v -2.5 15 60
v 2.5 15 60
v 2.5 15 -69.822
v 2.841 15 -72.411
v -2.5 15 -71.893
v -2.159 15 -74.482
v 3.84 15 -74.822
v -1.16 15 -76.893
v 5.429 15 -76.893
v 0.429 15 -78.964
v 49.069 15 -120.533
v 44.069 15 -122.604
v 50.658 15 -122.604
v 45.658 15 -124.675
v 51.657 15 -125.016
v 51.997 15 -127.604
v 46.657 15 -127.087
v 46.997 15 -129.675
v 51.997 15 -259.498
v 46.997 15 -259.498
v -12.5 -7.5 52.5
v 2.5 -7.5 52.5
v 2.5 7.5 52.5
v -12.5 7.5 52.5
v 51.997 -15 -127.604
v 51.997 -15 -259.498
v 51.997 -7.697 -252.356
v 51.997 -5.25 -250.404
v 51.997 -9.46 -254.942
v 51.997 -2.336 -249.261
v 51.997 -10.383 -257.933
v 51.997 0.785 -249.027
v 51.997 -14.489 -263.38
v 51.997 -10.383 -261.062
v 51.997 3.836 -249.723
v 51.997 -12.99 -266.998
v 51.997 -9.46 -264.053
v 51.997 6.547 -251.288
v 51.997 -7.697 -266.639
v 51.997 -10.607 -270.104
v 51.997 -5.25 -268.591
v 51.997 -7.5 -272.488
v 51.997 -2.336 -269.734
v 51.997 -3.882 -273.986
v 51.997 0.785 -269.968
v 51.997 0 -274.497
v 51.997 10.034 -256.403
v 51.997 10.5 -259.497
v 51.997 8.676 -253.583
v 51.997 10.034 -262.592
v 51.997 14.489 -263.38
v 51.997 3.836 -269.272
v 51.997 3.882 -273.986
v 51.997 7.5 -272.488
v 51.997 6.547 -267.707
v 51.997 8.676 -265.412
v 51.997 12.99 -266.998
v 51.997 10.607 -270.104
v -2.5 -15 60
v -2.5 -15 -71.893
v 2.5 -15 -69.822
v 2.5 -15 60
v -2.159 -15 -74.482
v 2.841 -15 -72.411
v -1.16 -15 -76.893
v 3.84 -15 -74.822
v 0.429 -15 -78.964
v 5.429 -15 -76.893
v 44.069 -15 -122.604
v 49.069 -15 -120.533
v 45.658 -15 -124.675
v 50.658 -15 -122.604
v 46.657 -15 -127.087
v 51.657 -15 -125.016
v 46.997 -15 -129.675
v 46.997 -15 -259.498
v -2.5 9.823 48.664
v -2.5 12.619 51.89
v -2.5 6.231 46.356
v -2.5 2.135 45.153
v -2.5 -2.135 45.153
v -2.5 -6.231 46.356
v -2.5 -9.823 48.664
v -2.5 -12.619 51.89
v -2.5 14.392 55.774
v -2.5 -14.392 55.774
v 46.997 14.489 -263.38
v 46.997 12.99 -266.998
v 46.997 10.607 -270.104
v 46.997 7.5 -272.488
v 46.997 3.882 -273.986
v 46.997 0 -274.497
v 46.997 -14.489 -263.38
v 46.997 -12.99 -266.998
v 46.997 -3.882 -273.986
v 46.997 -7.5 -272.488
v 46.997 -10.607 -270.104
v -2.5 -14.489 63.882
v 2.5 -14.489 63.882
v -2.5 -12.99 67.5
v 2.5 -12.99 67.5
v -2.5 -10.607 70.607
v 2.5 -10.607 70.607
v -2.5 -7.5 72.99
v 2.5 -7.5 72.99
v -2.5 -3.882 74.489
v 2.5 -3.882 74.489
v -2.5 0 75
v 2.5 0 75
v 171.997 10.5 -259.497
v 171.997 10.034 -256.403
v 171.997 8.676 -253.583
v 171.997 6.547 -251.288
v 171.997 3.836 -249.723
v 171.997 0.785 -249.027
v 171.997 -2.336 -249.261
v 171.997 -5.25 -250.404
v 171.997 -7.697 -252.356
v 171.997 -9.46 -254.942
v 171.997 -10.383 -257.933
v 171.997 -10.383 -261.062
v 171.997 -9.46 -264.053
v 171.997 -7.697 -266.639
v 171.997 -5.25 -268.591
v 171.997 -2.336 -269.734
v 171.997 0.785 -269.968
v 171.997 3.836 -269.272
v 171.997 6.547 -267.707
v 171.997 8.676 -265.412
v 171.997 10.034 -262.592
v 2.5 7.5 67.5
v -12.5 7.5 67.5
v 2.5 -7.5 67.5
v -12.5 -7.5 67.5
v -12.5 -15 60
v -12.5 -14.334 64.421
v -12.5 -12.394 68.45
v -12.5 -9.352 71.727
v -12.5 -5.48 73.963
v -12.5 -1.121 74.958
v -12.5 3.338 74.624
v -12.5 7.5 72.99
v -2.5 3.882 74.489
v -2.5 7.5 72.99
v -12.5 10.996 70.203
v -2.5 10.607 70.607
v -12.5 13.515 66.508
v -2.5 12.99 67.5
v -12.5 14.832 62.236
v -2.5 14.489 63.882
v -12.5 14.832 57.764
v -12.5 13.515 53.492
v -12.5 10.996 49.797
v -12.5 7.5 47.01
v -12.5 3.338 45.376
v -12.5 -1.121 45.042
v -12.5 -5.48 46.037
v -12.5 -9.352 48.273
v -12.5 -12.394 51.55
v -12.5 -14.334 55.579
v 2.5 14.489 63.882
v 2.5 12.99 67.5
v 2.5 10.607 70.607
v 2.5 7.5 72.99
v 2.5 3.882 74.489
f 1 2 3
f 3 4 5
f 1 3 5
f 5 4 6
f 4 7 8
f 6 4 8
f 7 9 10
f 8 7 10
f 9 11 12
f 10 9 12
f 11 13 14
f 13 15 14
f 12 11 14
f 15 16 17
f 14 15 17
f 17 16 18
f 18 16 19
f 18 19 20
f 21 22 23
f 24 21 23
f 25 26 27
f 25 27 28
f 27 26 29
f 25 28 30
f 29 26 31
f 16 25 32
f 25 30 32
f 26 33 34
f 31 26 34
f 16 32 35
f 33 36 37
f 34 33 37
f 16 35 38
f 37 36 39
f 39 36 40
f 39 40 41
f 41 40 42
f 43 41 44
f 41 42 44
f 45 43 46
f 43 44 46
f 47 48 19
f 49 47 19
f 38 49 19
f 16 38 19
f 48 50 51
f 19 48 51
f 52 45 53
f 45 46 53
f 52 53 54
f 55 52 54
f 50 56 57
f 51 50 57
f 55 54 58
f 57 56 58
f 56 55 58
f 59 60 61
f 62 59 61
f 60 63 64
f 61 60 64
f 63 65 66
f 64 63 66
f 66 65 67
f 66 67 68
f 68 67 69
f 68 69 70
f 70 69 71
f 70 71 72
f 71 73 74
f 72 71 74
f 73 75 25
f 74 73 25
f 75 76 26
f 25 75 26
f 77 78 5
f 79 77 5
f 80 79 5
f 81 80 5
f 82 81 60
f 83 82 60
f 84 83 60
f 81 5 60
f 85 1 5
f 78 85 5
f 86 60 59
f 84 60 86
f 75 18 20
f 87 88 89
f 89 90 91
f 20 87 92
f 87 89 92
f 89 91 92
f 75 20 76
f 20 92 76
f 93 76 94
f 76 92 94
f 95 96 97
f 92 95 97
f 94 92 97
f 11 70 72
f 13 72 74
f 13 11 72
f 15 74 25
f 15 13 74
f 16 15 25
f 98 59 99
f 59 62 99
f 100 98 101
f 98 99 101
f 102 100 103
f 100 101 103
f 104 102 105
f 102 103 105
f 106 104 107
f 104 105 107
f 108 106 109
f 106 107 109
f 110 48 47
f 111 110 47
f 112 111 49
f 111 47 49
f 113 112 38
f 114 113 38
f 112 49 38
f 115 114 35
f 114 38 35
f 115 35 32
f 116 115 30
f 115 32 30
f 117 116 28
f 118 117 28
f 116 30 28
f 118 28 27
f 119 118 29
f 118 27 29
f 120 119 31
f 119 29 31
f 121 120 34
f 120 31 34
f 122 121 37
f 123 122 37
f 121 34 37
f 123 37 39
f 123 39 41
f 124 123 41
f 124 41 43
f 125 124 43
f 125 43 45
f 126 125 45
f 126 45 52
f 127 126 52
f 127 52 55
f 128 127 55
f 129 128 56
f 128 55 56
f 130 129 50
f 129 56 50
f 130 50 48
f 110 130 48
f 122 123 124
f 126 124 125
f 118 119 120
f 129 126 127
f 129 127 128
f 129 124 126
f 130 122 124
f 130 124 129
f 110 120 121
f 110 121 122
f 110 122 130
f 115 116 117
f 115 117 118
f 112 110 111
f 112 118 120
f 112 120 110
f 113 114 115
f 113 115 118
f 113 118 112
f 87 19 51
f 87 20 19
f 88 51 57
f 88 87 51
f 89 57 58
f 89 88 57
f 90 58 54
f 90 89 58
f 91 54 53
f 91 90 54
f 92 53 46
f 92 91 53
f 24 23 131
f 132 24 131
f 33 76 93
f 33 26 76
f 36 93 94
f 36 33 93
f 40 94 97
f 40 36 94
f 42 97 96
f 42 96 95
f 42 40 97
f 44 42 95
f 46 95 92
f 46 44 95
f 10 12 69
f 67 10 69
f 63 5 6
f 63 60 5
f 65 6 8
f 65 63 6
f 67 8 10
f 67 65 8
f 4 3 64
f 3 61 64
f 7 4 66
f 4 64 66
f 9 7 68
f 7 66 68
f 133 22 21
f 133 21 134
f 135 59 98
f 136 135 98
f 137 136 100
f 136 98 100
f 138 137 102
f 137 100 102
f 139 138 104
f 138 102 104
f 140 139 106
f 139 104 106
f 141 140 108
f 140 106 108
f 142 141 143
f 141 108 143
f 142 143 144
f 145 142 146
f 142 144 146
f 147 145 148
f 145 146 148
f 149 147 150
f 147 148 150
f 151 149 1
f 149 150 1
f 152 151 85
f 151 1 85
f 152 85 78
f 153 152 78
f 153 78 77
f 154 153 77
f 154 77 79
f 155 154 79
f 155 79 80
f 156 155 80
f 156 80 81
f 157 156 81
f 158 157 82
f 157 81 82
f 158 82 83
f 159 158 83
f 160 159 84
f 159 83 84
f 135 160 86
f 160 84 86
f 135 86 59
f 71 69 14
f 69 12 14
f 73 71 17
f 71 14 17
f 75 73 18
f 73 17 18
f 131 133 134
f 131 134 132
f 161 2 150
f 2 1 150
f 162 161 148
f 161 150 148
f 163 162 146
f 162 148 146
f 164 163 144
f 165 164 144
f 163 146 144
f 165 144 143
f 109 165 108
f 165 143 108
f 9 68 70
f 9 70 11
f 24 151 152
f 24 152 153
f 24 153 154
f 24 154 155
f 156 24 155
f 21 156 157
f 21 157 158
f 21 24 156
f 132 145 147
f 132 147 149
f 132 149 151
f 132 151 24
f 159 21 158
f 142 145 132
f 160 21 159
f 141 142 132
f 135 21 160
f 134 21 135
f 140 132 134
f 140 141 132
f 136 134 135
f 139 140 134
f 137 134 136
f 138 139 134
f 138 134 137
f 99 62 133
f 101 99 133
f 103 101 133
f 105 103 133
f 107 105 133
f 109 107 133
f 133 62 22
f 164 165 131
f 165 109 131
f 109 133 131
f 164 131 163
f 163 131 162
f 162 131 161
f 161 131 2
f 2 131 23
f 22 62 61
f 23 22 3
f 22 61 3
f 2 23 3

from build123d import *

# Parameters (mm, degrees)
SKETCH6_W               = 5
SKETCH6_H               = 30
SKETCH7_R               = 15
BOSS_EXTRUDE1_DEPTH     = 10
CUT_EXTRUDE1_DEPTH      = 281.256736501
CUT_EXTRUDE1_DEPTH_BACK = 281.256736501
SKETCH7_3_W             = 15
SKETCH7_3_H             = 15
FILLET1_R               = 10
FILLET2_R               = 15
SKETCH9_R               = 10.5
BOSS_EXTRUDE2_DEPTH     = 120


with BuildPart() as part:
    # Sweep1: sweep along a path in Sketch2
    with BuildLine(Plane(origin=(0, 0, 0), x_dir=(1, 0, 0), z_dir=(0, 1, 0))) as sweep1_path:
        Line((0, -75), (0, 75))
        Line((0, 75), (49.497474683, 124.497474683))
        Line((49.497474683, 124.497474683), (49.497474683, 274.497474683))
    # Sketch6 → Sweep1 (sweep)
    with BuildSketch(Plane.XY.offset(75)):
        Rectangle(SKETCH6_W, SKETCH6_H)
    sweep(path=sweep1_path.line, transition=Transition.RIGHT)

    # Sketch7 → Boss-Extrude1 (add)
    with BuildSketch(Plane.ZY.offset(2.5)):
        with Locations(Location((60, 0, 0), (0, 0, 270))):
            Circle(SKETCH7_R)
    extrude(amount=BOSS_EXTRUDE1_DEPTH)

    # Sketch7<3> → Cut-Extrude1 (cut, two sides: drawn at the far end of the back side and taken through both)
    with BuildSketch(Plane.ZY.offset(2.5).offset(-CUT_EXTRUDE1_DEPTH_BACK)):
        with Locations((60, 0)):
            Rectangle(SKETCH7_3_W, SKETCH7_3_H)
    extrude(amount=CUT_EXTRUDE1_DEPTH + CUT_EXTRUDE1_DEPTH_BACK, mode=Mode.SUBTRACT)

    # Fillet1
    fillet1_edges = [part.edges().sort_by_distance(p)[0] for p in [
        (-2.5, 0, -76.035533906),
        (2.5, 0, -73.964466094),
        (51.997474683, 0, -123.461940777),
        (46.997474683, 0, -125.533008589),
    ]]
    fillet(fillet1_edges, radius=FILLET1_R)

    # Fillet2
    fillet2_edges = [part.edges().sort_by_distance(p)[0] for p in [
        (0, 15, 75),
        (0, -15, 75),
        (49.497474683, -15, -274.497474683),
        (49.497474683, 15, -274.497474683),
    ]]
    fillet(fillet2_edges, radius=FILLET2_R - 0.0001)  # a hair under: the kernel refuses the full size

    # Sketch9 → Boss-Extrude2 (add)
    with BuildSketch(Plane(origin=(51.997474683, 0, 0), x_dir=(0, 0, -1), z_dir=(1, 0, 0))):
        with Locations(Location((259.497474683, 0, 0), (0, 0, 90))):
            Circle(SKETCH9_R)
    extrude(amount=BOSS_EXTRUDE2_DEPTH)


solid = part.part
